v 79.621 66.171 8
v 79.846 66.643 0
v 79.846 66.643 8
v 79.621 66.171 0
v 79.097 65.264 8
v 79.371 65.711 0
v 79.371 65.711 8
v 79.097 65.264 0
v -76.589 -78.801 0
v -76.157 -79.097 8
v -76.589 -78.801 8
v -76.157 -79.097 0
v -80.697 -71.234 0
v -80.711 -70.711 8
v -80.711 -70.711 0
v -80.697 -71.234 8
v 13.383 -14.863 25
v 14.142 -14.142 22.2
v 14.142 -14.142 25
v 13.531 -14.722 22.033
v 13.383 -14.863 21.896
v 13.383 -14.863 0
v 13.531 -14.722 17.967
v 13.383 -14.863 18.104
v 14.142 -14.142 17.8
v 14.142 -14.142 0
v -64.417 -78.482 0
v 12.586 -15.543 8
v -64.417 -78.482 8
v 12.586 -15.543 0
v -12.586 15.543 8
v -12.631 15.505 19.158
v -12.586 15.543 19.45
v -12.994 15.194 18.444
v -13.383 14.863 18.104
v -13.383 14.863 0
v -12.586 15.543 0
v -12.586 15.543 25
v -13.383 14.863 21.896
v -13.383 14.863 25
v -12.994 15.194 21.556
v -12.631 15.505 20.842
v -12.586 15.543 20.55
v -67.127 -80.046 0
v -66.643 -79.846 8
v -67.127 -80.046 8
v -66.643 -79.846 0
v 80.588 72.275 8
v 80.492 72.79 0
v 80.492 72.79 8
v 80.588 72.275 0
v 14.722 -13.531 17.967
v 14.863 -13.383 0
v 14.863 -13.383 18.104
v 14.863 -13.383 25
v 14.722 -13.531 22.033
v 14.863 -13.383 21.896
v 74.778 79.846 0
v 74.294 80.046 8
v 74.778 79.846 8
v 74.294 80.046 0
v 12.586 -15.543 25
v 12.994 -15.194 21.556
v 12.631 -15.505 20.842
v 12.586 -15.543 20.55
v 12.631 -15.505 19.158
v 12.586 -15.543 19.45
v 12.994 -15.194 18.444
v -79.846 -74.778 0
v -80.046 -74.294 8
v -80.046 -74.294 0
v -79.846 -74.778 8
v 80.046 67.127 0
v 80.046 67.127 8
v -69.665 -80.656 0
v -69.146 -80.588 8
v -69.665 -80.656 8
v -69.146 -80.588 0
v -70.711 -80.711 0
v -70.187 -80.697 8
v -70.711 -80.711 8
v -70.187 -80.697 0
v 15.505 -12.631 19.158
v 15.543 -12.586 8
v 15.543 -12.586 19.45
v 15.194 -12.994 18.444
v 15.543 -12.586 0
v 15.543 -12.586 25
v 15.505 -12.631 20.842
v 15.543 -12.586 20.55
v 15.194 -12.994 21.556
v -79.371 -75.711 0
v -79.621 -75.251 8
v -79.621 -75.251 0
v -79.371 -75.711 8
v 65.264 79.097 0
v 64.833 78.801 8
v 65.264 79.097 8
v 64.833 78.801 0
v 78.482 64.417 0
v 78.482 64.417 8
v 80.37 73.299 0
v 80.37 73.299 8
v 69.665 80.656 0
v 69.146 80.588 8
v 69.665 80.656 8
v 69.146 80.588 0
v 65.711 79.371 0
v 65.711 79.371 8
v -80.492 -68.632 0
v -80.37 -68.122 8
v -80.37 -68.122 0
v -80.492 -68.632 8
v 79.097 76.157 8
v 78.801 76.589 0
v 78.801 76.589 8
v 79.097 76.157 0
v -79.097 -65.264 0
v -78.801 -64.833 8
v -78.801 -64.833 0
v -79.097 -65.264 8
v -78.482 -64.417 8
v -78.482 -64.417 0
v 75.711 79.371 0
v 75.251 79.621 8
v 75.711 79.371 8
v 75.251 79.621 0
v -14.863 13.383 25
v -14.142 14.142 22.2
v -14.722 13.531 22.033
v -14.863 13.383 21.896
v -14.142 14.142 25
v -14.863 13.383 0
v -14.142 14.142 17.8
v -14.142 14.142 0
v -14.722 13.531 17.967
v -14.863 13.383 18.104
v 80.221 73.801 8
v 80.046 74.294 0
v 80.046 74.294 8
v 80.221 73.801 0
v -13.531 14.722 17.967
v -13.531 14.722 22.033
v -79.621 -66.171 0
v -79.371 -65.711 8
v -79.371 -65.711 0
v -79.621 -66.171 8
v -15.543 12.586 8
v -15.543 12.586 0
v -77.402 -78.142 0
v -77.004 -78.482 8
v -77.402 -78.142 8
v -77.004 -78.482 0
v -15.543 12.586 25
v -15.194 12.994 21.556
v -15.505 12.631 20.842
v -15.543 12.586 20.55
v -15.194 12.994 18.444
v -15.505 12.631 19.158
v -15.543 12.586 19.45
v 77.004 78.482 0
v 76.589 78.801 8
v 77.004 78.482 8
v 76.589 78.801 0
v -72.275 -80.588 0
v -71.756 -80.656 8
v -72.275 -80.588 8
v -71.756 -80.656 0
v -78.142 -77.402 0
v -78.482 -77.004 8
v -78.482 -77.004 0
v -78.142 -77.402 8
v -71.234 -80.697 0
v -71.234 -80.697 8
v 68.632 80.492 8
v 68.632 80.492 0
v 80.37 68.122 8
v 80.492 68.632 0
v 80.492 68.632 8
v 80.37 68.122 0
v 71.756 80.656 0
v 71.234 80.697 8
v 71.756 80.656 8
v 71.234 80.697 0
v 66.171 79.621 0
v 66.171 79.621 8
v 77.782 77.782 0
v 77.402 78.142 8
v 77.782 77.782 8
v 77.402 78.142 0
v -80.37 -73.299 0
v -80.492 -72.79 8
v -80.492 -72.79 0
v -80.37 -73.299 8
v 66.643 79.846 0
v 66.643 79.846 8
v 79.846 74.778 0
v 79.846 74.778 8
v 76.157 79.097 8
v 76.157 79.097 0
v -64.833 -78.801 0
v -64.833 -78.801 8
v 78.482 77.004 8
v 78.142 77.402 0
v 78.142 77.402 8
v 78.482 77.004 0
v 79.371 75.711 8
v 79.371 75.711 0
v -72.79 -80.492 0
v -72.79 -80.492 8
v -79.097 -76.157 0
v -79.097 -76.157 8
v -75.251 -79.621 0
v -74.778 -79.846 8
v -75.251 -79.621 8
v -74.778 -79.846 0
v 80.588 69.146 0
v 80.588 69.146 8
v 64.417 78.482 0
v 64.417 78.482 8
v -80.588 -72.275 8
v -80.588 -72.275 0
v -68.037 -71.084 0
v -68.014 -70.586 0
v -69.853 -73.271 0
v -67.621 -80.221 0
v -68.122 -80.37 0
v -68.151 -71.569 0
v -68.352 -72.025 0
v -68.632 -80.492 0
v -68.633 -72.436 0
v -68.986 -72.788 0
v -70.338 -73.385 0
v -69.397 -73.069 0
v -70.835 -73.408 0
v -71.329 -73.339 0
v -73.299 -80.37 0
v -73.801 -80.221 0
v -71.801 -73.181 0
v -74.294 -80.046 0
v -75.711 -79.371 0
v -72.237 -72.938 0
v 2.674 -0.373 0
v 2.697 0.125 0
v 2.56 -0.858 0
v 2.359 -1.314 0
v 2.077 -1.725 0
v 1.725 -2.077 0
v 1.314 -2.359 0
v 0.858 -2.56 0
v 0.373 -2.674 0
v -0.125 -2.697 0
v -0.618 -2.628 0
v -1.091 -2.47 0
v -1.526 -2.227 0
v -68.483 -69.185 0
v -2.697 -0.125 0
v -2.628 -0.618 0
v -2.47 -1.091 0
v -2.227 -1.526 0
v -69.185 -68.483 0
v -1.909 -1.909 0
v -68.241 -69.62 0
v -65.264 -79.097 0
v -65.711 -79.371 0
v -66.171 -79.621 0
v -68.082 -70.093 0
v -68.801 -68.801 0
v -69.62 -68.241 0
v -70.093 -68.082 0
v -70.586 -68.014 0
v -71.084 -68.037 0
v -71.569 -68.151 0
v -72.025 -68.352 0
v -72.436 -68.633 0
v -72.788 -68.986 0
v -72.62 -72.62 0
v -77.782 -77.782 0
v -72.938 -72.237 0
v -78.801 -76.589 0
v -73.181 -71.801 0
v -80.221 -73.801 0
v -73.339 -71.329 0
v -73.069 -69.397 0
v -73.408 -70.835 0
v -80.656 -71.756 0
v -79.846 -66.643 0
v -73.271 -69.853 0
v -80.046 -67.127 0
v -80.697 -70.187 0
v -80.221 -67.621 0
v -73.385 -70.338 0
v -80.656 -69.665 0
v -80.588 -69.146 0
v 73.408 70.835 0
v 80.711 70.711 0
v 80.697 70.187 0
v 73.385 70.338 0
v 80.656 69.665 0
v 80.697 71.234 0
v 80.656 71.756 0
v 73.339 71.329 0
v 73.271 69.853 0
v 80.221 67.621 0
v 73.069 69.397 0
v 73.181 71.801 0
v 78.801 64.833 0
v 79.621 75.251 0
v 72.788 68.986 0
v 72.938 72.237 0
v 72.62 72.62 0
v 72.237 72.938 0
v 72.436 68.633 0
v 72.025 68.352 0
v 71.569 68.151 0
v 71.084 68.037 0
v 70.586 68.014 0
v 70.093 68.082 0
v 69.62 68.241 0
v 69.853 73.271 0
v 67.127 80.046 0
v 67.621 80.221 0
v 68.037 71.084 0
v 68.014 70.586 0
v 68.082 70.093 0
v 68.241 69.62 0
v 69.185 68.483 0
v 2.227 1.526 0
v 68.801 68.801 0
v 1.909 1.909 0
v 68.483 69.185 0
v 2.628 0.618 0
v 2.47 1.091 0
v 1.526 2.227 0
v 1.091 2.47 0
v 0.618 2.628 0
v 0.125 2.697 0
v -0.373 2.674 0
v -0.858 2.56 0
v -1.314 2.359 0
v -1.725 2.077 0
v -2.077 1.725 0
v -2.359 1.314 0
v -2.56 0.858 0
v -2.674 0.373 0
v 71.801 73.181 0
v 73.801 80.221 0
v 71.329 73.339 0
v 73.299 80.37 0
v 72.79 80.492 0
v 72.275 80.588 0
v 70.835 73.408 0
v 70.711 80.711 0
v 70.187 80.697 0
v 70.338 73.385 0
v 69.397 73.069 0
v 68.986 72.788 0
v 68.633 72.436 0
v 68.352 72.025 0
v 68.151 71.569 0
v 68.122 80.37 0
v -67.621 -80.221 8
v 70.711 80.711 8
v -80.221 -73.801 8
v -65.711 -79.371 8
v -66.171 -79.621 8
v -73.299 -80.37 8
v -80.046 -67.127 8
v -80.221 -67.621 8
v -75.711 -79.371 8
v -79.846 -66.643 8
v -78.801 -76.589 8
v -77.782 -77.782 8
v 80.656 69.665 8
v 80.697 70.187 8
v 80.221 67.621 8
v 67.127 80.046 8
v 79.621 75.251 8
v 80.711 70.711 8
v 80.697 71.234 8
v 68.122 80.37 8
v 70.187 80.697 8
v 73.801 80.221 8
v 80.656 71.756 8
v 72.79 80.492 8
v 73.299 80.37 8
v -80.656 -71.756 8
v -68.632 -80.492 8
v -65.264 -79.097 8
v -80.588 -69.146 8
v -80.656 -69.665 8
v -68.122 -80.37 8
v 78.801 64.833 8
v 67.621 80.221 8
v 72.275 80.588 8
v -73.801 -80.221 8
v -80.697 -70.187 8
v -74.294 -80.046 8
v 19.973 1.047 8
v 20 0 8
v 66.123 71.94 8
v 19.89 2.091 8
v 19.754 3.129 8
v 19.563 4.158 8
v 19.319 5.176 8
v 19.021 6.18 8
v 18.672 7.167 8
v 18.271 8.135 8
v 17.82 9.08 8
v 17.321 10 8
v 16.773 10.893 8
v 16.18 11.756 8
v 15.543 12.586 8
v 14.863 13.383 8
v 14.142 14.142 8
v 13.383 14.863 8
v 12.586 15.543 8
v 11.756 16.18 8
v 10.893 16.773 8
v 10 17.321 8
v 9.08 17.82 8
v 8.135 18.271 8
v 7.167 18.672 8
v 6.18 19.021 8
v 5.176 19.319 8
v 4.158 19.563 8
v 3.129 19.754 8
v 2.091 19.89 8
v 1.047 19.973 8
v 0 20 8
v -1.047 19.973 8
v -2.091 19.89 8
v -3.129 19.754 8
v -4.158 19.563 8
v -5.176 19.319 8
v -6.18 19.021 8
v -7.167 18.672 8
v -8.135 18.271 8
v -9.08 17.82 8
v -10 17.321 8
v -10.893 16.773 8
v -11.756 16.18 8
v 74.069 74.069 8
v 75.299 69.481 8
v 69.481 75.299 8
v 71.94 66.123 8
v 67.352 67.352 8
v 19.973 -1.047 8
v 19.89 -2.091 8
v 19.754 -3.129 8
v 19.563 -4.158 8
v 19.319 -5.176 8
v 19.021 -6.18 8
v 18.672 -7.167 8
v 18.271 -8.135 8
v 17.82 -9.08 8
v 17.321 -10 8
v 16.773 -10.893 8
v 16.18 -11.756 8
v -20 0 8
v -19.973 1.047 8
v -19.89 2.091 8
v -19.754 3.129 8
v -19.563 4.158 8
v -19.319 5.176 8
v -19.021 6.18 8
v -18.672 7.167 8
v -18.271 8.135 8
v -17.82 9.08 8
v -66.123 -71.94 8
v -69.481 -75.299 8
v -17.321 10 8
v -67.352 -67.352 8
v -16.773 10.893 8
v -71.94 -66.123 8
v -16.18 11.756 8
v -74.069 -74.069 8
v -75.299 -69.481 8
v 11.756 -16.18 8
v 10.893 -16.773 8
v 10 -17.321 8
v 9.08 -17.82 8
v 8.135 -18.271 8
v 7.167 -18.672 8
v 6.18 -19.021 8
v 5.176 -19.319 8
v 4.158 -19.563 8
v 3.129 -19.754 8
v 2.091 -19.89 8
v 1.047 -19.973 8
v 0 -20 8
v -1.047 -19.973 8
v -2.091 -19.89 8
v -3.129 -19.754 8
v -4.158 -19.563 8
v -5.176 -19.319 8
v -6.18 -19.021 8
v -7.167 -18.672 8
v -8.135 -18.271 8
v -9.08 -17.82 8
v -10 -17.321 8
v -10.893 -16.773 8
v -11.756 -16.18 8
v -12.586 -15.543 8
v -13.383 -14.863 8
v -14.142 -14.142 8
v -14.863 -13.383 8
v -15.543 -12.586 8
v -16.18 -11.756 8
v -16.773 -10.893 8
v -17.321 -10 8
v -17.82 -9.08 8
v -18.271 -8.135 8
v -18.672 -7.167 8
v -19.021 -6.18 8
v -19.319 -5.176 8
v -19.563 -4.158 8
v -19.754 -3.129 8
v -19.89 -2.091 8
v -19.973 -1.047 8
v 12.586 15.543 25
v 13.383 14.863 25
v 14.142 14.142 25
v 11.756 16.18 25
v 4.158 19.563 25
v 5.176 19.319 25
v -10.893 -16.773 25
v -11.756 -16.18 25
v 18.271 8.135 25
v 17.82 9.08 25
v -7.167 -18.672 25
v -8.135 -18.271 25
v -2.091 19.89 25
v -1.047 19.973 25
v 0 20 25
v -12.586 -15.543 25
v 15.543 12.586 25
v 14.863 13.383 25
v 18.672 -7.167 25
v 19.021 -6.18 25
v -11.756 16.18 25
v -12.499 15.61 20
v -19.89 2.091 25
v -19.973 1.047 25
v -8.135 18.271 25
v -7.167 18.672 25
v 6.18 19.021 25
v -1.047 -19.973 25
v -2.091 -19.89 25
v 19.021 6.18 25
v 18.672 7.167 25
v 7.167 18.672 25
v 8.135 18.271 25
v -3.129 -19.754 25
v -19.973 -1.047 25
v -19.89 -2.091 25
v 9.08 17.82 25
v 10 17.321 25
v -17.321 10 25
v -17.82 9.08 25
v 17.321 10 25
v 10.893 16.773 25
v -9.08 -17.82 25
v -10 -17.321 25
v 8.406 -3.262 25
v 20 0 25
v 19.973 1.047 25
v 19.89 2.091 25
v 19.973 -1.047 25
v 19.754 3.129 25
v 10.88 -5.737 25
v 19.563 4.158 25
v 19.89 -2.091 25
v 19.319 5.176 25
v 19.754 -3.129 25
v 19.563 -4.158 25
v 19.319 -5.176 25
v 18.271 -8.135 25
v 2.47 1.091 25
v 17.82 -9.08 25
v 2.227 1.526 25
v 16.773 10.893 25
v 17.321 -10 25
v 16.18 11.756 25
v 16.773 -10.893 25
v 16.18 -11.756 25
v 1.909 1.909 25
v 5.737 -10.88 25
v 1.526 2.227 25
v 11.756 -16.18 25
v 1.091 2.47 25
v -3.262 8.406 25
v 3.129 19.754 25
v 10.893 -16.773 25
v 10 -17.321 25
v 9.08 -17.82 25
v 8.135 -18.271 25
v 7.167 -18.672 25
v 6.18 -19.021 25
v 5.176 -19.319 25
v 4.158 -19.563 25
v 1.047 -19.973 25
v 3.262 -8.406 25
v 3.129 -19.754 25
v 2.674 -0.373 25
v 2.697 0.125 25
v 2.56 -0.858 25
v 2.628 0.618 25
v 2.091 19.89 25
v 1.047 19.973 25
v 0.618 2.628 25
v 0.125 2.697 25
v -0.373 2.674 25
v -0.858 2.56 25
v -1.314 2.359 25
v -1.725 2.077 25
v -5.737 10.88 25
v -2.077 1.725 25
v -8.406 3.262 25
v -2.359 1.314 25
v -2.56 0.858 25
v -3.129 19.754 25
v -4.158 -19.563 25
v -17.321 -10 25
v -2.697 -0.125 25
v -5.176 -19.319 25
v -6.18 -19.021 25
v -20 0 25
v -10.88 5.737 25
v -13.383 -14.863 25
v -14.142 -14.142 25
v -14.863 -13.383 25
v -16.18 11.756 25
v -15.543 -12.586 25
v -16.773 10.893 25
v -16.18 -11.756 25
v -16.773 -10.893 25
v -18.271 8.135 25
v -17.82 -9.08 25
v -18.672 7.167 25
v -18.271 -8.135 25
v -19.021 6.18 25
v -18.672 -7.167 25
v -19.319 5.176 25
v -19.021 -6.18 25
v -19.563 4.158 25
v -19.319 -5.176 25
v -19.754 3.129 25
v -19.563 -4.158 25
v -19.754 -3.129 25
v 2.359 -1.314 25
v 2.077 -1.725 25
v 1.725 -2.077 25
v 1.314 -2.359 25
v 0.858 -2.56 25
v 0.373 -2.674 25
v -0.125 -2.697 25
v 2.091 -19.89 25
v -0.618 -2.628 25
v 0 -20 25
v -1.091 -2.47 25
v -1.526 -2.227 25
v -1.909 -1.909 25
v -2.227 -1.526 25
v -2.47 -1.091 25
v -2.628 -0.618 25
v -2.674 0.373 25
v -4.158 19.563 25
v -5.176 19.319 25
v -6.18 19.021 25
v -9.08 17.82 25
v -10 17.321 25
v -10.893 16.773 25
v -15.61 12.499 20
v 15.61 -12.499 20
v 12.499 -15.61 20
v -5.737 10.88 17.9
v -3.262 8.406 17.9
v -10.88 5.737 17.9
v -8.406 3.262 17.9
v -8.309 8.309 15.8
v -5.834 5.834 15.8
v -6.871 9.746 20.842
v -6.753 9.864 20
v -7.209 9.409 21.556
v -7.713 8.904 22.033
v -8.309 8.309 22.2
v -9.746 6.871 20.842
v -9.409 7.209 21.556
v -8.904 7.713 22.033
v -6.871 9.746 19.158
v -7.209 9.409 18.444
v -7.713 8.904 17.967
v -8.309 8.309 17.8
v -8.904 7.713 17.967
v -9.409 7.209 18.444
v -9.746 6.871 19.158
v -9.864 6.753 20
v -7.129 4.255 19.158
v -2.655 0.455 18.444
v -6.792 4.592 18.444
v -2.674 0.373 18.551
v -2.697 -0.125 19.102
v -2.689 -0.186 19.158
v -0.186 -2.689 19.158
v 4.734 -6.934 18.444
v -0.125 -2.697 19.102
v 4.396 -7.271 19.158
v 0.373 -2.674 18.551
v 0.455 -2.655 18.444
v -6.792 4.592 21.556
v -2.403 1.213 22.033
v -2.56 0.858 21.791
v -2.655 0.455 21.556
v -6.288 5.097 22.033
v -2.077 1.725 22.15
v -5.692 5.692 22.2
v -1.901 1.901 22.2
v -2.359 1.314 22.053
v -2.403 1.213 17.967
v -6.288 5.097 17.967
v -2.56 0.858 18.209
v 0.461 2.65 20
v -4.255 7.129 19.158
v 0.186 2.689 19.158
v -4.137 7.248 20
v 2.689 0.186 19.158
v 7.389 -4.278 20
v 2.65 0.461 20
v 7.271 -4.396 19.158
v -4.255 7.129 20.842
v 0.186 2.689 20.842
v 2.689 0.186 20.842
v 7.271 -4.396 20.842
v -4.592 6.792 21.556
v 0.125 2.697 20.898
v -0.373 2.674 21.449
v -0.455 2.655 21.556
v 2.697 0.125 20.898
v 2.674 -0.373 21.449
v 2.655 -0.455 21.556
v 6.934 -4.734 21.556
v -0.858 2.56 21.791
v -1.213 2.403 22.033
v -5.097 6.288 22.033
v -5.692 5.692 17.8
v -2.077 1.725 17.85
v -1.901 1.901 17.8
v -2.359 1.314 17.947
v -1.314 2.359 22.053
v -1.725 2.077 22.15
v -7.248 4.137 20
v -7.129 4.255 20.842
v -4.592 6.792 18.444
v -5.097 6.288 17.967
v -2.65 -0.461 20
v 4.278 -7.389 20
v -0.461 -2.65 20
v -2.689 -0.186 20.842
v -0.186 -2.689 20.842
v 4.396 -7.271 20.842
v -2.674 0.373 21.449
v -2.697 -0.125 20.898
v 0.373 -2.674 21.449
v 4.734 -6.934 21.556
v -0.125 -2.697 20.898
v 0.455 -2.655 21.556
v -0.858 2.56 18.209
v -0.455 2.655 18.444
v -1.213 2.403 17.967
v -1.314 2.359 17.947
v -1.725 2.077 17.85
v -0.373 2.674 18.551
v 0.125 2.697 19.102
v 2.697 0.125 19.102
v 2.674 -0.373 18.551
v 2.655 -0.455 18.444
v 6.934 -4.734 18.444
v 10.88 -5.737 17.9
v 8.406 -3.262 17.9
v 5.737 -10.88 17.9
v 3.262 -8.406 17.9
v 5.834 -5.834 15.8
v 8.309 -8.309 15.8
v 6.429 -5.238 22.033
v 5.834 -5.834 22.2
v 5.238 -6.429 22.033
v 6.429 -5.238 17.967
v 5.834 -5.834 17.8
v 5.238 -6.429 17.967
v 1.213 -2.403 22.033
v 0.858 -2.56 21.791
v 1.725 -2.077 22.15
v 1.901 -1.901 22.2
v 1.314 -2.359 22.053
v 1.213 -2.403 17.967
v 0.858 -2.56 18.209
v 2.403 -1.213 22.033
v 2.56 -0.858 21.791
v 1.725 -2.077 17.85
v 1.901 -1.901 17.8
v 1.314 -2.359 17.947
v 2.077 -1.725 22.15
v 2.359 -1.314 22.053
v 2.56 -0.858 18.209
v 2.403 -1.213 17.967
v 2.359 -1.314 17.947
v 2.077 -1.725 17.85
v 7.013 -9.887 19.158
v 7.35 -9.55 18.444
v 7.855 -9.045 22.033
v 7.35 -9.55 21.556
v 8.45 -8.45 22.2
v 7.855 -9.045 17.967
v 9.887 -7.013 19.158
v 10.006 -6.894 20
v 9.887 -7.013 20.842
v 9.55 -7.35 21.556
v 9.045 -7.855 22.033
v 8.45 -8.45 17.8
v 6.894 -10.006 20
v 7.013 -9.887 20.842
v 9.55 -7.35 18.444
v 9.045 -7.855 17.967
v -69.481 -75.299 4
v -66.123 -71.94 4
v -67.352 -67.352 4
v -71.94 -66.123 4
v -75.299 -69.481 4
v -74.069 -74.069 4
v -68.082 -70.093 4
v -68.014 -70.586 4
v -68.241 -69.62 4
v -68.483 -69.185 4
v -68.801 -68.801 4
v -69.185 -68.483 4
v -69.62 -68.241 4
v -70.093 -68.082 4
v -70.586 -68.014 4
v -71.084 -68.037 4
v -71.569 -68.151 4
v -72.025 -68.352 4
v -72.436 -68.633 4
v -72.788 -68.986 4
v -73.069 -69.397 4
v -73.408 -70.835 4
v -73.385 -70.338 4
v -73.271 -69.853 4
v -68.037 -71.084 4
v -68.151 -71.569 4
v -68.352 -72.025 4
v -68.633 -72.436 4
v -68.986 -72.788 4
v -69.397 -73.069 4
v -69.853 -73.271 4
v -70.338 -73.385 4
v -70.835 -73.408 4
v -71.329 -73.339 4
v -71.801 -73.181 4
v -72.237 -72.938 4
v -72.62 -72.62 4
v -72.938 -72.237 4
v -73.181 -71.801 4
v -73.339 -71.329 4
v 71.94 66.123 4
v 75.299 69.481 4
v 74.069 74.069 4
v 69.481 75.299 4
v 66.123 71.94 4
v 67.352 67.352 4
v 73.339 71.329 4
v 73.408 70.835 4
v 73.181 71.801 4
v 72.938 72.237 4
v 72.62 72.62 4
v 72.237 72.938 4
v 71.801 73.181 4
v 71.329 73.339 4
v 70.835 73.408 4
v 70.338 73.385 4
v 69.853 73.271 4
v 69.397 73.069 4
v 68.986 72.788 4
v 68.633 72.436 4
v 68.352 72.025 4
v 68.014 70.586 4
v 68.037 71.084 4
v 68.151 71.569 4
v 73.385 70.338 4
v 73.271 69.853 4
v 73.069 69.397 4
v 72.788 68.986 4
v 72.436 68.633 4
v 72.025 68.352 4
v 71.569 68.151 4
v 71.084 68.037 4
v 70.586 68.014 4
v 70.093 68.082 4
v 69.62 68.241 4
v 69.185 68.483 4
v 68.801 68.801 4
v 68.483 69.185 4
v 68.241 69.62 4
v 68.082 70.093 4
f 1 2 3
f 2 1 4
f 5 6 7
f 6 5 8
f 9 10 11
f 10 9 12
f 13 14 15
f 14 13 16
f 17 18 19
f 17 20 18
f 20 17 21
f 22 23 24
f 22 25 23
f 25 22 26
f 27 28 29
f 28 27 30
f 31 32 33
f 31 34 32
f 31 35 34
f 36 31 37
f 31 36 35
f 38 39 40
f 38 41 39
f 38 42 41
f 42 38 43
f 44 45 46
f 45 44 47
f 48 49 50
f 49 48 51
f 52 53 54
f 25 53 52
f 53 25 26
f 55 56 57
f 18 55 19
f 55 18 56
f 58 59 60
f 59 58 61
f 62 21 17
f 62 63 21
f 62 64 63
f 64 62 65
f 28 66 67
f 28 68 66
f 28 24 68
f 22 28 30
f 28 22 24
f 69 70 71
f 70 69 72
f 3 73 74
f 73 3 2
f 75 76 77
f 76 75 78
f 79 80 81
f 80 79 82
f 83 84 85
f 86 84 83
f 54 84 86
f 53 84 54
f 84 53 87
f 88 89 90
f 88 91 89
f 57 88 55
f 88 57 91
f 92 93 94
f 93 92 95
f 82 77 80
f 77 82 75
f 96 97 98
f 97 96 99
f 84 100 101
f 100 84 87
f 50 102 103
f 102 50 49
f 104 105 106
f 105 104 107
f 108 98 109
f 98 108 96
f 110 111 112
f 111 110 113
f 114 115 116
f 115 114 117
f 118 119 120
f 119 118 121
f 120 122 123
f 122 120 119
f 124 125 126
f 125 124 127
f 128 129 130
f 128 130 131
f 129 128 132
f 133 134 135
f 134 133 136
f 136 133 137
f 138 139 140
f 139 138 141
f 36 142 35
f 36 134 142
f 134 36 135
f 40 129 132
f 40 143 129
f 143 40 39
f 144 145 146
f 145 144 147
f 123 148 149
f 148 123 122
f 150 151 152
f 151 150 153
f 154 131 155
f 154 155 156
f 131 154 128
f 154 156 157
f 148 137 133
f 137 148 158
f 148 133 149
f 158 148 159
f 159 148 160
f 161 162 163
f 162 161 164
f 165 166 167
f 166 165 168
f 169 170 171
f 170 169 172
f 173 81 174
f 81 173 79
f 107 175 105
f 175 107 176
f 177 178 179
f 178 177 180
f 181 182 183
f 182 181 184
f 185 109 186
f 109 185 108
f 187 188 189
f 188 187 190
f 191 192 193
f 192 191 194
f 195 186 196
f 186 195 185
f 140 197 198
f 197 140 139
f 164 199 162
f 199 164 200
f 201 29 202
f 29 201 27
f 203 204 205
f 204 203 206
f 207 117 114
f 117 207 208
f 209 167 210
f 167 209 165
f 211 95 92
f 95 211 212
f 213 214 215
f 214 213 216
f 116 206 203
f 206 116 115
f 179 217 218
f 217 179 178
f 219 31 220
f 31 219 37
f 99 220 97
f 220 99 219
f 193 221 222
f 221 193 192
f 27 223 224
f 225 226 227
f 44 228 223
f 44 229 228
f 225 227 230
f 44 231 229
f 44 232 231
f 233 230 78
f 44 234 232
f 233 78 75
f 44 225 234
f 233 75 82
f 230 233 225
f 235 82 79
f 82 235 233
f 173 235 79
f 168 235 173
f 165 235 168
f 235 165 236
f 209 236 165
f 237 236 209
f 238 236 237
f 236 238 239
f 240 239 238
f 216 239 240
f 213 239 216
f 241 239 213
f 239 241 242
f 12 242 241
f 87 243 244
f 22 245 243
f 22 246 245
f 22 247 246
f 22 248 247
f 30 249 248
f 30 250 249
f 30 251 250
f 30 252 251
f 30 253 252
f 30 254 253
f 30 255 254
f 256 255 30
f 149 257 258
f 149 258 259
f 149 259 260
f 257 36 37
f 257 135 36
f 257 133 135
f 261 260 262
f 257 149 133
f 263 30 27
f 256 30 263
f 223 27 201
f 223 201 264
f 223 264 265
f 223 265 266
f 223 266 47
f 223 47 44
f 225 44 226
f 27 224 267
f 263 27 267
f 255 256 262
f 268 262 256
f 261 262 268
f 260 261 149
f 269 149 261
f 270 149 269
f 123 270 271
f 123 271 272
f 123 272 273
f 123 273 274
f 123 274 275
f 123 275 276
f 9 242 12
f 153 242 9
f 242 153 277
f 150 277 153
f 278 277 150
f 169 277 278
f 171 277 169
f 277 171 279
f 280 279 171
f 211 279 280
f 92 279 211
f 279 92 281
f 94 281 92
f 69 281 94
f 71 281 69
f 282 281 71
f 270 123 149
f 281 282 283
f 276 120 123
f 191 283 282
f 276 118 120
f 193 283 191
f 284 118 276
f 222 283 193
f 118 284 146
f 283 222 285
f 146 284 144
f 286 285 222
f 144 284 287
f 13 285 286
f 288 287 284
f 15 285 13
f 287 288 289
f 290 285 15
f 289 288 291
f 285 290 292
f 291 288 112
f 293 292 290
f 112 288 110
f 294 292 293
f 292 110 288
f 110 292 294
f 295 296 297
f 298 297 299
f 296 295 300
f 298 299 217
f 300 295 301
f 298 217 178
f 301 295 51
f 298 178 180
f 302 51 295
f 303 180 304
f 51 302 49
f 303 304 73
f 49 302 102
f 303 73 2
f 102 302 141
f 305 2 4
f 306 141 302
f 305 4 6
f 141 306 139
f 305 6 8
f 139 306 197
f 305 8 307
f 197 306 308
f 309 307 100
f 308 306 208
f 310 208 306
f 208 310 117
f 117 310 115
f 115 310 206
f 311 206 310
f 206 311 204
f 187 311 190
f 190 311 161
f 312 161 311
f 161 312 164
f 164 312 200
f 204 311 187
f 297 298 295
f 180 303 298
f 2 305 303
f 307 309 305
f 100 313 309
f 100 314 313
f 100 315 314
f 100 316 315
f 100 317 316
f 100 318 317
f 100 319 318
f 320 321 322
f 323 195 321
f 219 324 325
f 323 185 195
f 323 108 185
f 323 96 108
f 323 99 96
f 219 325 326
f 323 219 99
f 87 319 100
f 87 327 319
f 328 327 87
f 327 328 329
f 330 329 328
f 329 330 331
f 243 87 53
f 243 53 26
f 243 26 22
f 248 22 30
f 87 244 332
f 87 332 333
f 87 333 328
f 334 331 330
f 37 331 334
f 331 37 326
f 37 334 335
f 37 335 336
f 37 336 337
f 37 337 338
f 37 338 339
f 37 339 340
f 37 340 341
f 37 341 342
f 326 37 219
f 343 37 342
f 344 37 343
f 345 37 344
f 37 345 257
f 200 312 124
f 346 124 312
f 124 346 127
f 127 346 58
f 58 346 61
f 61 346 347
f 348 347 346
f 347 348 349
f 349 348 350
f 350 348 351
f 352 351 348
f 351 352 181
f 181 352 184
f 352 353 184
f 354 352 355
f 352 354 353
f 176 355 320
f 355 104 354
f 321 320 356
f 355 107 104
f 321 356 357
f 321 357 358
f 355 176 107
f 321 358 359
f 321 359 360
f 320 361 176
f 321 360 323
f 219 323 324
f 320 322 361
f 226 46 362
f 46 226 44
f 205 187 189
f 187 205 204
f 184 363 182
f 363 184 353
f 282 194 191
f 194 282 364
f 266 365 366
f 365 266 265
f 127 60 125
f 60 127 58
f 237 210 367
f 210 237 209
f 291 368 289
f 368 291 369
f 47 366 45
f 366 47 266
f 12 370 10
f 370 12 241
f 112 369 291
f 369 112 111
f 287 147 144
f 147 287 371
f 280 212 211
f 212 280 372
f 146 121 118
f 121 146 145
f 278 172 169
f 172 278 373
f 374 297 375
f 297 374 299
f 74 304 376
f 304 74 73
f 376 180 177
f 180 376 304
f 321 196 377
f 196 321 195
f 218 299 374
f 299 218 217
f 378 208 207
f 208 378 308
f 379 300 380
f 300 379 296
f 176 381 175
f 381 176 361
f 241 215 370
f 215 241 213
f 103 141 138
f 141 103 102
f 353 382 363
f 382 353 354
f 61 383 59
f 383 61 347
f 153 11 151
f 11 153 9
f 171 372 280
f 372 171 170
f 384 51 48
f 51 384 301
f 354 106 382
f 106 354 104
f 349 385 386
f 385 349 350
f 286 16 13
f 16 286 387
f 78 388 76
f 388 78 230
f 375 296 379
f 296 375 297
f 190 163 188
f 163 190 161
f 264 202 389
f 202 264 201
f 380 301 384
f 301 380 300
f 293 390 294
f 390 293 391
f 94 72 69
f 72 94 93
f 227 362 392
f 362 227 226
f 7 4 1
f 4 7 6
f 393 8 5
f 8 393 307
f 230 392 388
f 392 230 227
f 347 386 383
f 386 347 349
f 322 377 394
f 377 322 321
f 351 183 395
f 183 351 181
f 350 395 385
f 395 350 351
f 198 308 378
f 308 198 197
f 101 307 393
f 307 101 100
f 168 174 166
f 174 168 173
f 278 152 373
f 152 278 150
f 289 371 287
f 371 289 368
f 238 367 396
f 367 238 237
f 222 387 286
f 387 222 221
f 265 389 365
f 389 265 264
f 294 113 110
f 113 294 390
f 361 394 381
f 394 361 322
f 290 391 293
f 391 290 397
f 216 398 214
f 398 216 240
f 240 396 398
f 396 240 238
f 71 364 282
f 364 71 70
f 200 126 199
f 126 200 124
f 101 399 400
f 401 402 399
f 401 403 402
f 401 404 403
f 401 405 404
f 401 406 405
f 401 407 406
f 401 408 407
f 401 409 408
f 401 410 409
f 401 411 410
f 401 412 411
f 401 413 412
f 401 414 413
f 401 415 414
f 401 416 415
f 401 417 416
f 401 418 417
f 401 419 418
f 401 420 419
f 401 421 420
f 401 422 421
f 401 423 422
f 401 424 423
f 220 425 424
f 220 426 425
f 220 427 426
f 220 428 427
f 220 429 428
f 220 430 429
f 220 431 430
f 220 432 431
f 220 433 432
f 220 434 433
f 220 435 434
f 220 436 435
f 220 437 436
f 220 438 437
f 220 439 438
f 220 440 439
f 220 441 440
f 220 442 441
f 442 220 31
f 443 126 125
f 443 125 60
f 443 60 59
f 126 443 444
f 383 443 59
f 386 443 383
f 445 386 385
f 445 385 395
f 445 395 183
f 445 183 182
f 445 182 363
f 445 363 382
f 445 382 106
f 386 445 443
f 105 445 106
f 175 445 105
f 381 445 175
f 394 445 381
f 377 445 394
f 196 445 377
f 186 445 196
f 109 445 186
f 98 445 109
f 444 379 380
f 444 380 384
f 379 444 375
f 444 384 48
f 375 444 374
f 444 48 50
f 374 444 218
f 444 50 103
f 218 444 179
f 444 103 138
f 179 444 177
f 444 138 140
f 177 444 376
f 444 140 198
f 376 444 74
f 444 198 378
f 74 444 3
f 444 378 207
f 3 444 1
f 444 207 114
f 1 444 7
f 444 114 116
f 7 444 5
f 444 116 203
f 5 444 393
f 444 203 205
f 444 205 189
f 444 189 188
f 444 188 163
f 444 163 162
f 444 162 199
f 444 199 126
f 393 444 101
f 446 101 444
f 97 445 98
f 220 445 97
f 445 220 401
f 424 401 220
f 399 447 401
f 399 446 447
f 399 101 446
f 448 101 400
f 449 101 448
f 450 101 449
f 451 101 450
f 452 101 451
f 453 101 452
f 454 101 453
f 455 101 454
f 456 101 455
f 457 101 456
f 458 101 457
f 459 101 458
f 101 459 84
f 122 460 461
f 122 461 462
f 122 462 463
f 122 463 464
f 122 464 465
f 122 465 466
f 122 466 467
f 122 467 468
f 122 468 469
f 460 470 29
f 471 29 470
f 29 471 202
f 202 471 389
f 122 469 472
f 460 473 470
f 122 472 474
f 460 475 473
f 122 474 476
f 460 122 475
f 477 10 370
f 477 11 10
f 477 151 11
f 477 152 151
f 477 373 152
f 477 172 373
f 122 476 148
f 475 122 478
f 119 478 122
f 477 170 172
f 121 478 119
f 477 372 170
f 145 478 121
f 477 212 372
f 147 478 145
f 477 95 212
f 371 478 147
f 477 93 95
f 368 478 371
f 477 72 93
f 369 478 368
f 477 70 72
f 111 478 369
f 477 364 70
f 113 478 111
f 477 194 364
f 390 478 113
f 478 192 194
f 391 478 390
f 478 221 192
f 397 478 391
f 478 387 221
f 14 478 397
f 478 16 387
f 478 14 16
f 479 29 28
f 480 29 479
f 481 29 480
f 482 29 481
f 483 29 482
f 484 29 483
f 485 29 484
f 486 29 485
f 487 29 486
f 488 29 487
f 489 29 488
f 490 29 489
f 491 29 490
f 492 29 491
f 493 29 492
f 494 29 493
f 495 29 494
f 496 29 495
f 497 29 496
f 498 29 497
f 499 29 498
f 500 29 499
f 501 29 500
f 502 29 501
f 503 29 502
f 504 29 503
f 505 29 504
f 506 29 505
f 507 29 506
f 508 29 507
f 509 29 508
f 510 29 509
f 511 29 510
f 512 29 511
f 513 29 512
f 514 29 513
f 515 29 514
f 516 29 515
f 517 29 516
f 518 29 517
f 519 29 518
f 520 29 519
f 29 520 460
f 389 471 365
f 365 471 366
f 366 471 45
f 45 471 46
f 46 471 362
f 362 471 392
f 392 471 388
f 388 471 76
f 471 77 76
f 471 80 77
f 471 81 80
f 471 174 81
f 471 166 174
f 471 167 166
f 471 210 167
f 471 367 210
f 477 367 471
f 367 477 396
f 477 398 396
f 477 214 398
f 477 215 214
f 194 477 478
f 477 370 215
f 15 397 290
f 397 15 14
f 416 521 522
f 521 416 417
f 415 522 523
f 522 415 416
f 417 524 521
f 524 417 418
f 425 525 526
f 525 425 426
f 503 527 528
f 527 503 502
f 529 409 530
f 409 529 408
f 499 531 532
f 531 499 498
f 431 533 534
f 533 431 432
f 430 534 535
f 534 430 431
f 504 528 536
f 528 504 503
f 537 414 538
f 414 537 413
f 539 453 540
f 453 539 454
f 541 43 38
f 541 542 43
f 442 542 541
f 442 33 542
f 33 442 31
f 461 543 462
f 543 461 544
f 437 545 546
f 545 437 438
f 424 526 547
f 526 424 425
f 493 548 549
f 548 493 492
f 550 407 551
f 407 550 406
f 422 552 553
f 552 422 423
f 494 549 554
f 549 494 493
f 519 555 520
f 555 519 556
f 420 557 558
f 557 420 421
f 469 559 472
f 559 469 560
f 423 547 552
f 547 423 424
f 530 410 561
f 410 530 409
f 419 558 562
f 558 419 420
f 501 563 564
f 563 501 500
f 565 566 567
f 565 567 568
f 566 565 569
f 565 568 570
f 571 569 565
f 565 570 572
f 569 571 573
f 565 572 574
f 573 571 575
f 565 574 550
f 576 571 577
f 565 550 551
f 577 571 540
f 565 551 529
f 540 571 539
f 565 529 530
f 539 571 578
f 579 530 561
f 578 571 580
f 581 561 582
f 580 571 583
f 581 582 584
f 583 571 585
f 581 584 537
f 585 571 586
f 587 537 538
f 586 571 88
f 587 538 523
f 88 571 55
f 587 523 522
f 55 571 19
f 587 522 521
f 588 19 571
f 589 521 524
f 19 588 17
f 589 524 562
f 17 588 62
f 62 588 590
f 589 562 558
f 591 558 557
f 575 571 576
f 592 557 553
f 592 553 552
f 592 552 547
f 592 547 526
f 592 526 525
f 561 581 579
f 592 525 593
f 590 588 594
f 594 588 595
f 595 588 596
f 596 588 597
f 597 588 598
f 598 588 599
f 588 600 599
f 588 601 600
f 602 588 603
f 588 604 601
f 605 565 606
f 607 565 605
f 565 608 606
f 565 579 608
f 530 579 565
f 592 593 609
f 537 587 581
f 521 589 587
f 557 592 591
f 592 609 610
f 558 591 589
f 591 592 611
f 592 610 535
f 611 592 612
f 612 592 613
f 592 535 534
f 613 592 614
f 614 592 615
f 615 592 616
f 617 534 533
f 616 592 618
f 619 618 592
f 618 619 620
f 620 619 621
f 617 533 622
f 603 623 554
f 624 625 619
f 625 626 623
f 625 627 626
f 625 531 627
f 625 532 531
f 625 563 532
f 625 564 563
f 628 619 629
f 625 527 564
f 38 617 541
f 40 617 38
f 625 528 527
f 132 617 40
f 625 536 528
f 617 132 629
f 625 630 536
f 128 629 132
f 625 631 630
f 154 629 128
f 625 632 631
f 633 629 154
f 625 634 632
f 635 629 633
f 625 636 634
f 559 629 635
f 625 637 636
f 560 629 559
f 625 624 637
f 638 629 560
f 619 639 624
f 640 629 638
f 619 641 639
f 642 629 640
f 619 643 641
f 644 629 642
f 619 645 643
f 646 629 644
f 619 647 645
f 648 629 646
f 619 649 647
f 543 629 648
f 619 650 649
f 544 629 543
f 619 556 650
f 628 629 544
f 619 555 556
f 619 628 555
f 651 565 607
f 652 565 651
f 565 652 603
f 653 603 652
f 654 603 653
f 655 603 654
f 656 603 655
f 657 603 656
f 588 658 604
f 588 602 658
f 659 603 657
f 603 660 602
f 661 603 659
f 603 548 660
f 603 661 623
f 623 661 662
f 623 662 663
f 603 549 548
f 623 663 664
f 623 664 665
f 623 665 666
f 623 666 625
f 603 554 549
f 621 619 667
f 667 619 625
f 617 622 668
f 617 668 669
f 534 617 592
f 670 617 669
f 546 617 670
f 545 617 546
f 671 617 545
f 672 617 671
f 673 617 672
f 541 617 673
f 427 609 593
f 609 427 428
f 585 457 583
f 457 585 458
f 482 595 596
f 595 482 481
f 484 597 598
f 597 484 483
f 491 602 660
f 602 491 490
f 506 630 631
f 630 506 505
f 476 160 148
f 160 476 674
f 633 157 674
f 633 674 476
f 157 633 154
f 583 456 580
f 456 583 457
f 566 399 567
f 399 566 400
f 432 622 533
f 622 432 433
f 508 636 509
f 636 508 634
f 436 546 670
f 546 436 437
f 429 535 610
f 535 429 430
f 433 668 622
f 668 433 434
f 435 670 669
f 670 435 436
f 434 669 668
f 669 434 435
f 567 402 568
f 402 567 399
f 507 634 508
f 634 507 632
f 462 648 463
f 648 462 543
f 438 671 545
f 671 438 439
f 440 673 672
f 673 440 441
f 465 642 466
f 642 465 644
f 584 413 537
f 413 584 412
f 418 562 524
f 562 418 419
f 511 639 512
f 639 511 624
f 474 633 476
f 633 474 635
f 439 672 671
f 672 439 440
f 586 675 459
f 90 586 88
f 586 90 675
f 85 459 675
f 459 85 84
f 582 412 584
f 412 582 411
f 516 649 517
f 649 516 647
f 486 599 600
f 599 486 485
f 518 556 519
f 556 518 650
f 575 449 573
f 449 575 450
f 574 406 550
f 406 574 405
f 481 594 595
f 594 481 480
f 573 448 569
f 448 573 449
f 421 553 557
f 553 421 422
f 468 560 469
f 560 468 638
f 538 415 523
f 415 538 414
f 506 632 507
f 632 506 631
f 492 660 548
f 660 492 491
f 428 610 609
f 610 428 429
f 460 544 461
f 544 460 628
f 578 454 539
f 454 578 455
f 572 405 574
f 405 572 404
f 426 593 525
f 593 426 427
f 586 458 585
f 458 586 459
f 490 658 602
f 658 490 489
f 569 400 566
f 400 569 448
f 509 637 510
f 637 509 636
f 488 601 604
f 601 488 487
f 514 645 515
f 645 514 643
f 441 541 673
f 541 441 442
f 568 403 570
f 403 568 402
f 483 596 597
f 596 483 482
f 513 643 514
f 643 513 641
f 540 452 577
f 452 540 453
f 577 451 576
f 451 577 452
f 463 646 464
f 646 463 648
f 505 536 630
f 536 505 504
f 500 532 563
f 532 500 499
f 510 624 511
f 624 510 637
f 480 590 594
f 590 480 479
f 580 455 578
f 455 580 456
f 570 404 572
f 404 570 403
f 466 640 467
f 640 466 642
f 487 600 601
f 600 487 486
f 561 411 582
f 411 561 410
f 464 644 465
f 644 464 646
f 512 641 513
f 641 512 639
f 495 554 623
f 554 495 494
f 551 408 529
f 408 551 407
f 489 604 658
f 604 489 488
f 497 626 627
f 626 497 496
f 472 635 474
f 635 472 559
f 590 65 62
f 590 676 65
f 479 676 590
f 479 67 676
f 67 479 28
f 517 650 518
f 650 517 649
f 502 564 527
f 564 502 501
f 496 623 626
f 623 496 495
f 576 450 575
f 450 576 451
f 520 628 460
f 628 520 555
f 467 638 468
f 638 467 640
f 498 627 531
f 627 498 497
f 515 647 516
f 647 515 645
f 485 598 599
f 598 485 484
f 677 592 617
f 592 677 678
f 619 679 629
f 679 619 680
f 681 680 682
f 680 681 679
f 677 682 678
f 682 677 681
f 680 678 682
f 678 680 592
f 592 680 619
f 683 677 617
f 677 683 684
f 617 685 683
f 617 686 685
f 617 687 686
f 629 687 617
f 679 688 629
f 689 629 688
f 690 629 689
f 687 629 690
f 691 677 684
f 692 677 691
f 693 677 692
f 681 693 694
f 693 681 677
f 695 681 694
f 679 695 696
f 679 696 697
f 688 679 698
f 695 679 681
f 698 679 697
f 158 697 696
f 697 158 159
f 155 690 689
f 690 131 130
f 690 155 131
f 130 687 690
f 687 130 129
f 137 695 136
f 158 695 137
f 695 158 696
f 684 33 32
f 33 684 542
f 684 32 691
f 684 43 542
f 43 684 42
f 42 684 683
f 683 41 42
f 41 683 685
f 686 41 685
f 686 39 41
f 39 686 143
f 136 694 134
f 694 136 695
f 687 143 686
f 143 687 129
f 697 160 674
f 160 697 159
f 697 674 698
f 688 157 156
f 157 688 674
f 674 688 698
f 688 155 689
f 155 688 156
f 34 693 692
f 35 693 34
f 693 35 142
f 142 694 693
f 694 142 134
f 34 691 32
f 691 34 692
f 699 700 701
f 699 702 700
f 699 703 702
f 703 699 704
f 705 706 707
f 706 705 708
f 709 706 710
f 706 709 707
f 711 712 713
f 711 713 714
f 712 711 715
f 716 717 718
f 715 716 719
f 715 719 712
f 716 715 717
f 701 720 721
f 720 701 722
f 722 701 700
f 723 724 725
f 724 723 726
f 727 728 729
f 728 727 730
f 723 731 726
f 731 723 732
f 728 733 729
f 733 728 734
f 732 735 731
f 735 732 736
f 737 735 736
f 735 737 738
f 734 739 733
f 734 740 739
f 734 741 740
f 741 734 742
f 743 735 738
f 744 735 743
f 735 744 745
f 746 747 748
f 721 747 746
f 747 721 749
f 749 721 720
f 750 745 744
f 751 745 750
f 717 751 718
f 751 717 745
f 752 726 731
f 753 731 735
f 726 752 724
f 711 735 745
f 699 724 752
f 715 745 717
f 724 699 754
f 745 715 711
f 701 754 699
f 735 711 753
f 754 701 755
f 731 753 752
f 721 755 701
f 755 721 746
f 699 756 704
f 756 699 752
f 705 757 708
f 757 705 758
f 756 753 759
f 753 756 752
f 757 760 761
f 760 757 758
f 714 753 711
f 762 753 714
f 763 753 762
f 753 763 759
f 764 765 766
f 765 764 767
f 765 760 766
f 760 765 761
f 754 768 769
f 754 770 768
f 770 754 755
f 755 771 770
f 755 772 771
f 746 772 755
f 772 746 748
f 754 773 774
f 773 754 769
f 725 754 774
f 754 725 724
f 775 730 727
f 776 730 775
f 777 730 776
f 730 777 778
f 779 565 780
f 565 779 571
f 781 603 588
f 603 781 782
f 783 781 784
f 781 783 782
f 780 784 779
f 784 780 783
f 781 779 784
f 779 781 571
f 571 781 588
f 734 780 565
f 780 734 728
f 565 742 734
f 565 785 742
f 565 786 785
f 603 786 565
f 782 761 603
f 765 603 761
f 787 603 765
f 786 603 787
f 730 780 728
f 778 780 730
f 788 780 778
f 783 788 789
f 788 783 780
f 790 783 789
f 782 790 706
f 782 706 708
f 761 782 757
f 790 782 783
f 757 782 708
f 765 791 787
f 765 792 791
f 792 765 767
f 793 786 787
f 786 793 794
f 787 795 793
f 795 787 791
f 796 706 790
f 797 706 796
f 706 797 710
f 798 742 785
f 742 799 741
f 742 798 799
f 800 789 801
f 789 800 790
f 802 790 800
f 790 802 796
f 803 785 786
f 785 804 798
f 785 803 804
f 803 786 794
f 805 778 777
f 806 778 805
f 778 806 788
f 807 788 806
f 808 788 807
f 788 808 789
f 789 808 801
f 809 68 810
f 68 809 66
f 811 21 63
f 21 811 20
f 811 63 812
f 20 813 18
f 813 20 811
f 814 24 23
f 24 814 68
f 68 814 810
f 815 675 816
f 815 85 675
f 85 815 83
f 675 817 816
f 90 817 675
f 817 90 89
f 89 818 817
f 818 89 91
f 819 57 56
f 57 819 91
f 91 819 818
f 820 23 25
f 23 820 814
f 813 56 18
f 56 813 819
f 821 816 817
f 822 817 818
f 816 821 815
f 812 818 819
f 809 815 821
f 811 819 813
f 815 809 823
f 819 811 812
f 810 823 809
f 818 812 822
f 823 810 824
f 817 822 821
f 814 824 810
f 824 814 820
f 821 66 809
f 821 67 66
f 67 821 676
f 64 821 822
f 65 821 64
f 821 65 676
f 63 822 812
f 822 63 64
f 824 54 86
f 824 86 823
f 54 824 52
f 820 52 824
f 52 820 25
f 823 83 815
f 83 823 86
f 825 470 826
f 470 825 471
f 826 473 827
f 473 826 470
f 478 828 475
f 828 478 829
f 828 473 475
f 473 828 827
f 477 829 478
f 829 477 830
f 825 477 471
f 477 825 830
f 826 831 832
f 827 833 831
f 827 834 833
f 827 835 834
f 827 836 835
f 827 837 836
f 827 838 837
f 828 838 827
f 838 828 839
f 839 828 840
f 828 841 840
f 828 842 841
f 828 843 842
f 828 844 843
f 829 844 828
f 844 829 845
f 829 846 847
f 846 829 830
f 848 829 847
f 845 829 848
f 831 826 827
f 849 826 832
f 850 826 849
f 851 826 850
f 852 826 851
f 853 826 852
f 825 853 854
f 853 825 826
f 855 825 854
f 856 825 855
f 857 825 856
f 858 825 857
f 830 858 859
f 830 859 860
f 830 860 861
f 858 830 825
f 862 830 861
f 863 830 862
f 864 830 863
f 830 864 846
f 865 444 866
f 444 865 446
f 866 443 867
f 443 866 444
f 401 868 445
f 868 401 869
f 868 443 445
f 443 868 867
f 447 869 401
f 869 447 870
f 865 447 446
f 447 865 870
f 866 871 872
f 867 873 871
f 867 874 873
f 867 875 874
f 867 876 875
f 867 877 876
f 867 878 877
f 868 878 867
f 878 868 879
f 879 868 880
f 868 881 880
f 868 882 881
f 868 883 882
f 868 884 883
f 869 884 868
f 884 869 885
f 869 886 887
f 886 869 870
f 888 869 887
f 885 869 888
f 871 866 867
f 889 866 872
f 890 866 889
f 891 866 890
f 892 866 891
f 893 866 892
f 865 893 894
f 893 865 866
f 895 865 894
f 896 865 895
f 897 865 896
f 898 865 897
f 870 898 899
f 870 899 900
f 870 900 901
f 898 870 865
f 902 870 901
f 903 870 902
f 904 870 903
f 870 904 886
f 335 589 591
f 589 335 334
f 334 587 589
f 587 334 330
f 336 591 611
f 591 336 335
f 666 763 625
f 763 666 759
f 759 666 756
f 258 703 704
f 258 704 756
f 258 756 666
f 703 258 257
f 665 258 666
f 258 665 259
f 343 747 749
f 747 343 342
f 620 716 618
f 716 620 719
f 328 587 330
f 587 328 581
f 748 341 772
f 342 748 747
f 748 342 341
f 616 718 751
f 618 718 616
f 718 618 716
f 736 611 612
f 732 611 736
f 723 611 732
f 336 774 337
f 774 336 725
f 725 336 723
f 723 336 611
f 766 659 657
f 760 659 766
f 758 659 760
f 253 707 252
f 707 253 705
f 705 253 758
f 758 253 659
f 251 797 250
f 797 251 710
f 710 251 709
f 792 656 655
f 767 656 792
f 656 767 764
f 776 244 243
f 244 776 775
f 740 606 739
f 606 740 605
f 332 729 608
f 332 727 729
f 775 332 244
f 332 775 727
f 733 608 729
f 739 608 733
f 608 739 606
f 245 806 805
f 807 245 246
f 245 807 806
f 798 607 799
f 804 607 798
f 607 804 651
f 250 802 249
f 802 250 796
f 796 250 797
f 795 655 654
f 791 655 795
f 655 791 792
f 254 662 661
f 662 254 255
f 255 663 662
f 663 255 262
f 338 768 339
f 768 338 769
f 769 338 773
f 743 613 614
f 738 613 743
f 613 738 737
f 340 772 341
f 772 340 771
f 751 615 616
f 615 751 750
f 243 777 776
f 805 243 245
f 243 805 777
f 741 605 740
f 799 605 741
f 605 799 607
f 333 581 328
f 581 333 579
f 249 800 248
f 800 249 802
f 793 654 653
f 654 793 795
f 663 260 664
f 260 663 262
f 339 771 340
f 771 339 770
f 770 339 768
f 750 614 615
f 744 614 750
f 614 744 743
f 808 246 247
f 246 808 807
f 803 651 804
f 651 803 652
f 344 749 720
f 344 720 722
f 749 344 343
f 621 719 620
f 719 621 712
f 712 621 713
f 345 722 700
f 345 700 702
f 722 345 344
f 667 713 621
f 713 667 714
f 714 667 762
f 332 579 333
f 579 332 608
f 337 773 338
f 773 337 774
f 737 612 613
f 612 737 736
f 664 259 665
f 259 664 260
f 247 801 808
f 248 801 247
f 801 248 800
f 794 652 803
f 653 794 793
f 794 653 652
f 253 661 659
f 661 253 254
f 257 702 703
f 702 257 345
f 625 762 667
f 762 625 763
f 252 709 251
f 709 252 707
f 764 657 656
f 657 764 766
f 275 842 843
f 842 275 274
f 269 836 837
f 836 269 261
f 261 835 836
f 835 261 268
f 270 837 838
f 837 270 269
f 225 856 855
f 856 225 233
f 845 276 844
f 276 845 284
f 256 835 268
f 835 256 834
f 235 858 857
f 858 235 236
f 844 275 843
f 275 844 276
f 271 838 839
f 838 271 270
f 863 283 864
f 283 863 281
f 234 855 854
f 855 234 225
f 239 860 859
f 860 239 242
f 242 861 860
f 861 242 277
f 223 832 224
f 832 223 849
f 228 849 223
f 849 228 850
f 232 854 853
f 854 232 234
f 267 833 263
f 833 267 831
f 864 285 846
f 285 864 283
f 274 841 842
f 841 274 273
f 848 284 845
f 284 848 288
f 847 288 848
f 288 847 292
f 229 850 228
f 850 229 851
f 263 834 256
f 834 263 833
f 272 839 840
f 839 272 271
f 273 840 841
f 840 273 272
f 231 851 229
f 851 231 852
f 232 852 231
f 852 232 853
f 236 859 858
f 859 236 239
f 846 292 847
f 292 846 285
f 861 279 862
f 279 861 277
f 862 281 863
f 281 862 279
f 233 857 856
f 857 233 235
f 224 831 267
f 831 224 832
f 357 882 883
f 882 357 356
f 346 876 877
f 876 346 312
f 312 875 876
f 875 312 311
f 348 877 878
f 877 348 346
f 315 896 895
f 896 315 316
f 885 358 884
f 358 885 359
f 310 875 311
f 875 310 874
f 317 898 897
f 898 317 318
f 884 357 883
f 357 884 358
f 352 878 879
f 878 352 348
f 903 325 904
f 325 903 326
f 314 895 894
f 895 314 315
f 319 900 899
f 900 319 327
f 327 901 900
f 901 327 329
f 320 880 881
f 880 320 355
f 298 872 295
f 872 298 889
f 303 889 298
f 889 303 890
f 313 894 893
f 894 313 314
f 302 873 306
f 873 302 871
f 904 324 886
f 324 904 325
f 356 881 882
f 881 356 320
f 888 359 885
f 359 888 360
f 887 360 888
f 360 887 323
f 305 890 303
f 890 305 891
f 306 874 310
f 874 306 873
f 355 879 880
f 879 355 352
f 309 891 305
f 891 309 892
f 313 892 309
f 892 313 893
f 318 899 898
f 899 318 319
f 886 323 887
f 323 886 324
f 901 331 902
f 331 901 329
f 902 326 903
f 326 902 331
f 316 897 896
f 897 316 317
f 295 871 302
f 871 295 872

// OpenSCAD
$fs=$fs/4;
$fa=$fa/4;

include <../config.scad>;

e=4;
h=30;
diametre=200;

h1=8;



module lame(){
    difference(){
        union(){
           hull(){
               translate([-diametre/2,  0, 0])cylinder(r=10, h=h1);
               translate([0,  0, 0])cylinder(r=20, h=h1);
               translate([diametre/2,  0, 0])cylinder(r=10, h=h1);
           }
           translate([0,  0, 0])cylinder(r=20, h=25);
       }
       translate([0,  0, -1])cylinder(r=2.7, h=30);
       translate([0,  10, 20])rotate([0,-90,90]) support_nut(4,10,10);
       translate([0,  -10, 20])rotate([0,-90,90]) support_nut(4,10,10);
       
       translate([-diametre/2,  0, h1/2])nut(5,10);
       translate([-diametre/2,  0, -1]) cylinder(r=2.7, h=30);
       translate([diametre/2,  0, h1/2])nut(5,10);
       translate([diametre/2,  0, -1]) cylinder(r=2.7, h=30);
       
   }
   
};

rotate([0,0,45])lame();
